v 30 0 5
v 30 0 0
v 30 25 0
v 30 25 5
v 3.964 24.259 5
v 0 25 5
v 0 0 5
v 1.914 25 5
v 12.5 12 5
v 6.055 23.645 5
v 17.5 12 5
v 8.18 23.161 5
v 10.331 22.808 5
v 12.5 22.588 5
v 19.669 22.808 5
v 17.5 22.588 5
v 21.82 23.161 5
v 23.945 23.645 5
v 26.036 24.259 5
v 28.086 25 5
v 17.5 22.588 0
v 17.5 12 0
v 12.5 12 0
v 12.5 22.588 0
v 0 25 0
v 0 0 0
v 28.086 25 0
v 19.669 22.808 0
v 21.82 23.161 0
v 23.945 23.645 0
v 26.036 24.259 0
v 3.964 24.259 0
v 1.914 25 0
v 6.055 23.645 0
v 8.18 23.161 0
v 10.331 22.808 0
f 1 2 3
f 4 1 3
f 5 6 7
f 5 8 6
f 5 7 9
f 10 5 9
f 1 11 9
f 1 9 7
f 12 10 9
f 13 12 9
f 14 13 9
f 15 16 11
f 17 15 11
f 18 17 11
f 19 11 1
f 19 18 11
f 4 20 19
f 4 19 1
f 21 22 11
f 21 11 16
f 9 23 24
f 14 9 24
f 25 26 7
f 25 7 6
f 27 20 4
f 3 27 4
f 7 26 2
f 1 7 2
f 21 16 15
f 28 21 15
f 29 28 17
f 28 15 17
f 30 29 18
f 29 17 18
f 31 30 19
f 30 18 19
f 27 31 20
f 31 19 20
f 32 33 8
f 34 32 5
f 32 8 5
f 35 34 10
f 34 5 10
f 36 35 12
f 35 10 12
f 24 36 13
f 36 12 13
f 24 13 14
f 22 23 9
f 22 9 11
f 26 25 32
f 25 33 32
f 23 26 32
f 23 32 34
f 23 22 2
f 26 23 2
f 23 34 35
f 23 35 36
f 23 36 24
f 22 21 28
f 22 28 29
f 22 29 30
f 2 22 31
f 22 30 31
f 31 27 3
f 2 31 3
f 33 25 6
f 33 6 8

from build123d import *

# Parameters (mm, degrees)
SKETCH1_W               = 30
SKETCH1_H               = 25
BOSS_EXTRUDE1_DEPTH     = 5
BOSS_EXTRUDE6_START     = -5
BOSS_EXTRUDE6_OUTLINE_W = 5
BOSS_EXTRUDE6_OUTLINE_H = 13
BOSS_EXTRUDE6_DEPTH     = 5
SKETCH5_R               = 35.5
CUT_EXTRUDE1_DEPTH      = 31


# Read off the part's stored shape, not the designer's step: Boss-Extrude6
with BuildPart() as part:
    # Sketch1 → Boss-Extrude1 (new body)
    with BuildSketch(Plane.XY):
        with Locations((15, 12.5)):
            Rectangle(SKETCH1_W, SKETCH1_H)
    extrude(amount=BOSS_EXTRUDE1_DEPTH)

    # Boss-Extrude6 outline → Boss-Extrude6 (cut)
    with BuildSketch(Plane.XY.offset(5).offset(BOSS_EXTRUDE6_START)):
        with Locations((15, 18.5)):
            Rectangle(BOSS_EXTRUDE6_OUTLINE_W, BOSS_EXTRUDE6_OUTLINE_H)
    extrude(amount=BOSS_EXTRUDE6_DEPTH, mode=Mode.SUBTRACT)

    # Sketch5 → Cut-Extrude1 (cut)
    with BuildSketch(Plane.XY.offset(5)):
        with Locations((15, 58)):
            Circle(SKETCH5_R)
    extrude(amount=-CUT_EXTRUDE1_DEPTH, mode=Mode.SUBTRACT)


solid = part.part
